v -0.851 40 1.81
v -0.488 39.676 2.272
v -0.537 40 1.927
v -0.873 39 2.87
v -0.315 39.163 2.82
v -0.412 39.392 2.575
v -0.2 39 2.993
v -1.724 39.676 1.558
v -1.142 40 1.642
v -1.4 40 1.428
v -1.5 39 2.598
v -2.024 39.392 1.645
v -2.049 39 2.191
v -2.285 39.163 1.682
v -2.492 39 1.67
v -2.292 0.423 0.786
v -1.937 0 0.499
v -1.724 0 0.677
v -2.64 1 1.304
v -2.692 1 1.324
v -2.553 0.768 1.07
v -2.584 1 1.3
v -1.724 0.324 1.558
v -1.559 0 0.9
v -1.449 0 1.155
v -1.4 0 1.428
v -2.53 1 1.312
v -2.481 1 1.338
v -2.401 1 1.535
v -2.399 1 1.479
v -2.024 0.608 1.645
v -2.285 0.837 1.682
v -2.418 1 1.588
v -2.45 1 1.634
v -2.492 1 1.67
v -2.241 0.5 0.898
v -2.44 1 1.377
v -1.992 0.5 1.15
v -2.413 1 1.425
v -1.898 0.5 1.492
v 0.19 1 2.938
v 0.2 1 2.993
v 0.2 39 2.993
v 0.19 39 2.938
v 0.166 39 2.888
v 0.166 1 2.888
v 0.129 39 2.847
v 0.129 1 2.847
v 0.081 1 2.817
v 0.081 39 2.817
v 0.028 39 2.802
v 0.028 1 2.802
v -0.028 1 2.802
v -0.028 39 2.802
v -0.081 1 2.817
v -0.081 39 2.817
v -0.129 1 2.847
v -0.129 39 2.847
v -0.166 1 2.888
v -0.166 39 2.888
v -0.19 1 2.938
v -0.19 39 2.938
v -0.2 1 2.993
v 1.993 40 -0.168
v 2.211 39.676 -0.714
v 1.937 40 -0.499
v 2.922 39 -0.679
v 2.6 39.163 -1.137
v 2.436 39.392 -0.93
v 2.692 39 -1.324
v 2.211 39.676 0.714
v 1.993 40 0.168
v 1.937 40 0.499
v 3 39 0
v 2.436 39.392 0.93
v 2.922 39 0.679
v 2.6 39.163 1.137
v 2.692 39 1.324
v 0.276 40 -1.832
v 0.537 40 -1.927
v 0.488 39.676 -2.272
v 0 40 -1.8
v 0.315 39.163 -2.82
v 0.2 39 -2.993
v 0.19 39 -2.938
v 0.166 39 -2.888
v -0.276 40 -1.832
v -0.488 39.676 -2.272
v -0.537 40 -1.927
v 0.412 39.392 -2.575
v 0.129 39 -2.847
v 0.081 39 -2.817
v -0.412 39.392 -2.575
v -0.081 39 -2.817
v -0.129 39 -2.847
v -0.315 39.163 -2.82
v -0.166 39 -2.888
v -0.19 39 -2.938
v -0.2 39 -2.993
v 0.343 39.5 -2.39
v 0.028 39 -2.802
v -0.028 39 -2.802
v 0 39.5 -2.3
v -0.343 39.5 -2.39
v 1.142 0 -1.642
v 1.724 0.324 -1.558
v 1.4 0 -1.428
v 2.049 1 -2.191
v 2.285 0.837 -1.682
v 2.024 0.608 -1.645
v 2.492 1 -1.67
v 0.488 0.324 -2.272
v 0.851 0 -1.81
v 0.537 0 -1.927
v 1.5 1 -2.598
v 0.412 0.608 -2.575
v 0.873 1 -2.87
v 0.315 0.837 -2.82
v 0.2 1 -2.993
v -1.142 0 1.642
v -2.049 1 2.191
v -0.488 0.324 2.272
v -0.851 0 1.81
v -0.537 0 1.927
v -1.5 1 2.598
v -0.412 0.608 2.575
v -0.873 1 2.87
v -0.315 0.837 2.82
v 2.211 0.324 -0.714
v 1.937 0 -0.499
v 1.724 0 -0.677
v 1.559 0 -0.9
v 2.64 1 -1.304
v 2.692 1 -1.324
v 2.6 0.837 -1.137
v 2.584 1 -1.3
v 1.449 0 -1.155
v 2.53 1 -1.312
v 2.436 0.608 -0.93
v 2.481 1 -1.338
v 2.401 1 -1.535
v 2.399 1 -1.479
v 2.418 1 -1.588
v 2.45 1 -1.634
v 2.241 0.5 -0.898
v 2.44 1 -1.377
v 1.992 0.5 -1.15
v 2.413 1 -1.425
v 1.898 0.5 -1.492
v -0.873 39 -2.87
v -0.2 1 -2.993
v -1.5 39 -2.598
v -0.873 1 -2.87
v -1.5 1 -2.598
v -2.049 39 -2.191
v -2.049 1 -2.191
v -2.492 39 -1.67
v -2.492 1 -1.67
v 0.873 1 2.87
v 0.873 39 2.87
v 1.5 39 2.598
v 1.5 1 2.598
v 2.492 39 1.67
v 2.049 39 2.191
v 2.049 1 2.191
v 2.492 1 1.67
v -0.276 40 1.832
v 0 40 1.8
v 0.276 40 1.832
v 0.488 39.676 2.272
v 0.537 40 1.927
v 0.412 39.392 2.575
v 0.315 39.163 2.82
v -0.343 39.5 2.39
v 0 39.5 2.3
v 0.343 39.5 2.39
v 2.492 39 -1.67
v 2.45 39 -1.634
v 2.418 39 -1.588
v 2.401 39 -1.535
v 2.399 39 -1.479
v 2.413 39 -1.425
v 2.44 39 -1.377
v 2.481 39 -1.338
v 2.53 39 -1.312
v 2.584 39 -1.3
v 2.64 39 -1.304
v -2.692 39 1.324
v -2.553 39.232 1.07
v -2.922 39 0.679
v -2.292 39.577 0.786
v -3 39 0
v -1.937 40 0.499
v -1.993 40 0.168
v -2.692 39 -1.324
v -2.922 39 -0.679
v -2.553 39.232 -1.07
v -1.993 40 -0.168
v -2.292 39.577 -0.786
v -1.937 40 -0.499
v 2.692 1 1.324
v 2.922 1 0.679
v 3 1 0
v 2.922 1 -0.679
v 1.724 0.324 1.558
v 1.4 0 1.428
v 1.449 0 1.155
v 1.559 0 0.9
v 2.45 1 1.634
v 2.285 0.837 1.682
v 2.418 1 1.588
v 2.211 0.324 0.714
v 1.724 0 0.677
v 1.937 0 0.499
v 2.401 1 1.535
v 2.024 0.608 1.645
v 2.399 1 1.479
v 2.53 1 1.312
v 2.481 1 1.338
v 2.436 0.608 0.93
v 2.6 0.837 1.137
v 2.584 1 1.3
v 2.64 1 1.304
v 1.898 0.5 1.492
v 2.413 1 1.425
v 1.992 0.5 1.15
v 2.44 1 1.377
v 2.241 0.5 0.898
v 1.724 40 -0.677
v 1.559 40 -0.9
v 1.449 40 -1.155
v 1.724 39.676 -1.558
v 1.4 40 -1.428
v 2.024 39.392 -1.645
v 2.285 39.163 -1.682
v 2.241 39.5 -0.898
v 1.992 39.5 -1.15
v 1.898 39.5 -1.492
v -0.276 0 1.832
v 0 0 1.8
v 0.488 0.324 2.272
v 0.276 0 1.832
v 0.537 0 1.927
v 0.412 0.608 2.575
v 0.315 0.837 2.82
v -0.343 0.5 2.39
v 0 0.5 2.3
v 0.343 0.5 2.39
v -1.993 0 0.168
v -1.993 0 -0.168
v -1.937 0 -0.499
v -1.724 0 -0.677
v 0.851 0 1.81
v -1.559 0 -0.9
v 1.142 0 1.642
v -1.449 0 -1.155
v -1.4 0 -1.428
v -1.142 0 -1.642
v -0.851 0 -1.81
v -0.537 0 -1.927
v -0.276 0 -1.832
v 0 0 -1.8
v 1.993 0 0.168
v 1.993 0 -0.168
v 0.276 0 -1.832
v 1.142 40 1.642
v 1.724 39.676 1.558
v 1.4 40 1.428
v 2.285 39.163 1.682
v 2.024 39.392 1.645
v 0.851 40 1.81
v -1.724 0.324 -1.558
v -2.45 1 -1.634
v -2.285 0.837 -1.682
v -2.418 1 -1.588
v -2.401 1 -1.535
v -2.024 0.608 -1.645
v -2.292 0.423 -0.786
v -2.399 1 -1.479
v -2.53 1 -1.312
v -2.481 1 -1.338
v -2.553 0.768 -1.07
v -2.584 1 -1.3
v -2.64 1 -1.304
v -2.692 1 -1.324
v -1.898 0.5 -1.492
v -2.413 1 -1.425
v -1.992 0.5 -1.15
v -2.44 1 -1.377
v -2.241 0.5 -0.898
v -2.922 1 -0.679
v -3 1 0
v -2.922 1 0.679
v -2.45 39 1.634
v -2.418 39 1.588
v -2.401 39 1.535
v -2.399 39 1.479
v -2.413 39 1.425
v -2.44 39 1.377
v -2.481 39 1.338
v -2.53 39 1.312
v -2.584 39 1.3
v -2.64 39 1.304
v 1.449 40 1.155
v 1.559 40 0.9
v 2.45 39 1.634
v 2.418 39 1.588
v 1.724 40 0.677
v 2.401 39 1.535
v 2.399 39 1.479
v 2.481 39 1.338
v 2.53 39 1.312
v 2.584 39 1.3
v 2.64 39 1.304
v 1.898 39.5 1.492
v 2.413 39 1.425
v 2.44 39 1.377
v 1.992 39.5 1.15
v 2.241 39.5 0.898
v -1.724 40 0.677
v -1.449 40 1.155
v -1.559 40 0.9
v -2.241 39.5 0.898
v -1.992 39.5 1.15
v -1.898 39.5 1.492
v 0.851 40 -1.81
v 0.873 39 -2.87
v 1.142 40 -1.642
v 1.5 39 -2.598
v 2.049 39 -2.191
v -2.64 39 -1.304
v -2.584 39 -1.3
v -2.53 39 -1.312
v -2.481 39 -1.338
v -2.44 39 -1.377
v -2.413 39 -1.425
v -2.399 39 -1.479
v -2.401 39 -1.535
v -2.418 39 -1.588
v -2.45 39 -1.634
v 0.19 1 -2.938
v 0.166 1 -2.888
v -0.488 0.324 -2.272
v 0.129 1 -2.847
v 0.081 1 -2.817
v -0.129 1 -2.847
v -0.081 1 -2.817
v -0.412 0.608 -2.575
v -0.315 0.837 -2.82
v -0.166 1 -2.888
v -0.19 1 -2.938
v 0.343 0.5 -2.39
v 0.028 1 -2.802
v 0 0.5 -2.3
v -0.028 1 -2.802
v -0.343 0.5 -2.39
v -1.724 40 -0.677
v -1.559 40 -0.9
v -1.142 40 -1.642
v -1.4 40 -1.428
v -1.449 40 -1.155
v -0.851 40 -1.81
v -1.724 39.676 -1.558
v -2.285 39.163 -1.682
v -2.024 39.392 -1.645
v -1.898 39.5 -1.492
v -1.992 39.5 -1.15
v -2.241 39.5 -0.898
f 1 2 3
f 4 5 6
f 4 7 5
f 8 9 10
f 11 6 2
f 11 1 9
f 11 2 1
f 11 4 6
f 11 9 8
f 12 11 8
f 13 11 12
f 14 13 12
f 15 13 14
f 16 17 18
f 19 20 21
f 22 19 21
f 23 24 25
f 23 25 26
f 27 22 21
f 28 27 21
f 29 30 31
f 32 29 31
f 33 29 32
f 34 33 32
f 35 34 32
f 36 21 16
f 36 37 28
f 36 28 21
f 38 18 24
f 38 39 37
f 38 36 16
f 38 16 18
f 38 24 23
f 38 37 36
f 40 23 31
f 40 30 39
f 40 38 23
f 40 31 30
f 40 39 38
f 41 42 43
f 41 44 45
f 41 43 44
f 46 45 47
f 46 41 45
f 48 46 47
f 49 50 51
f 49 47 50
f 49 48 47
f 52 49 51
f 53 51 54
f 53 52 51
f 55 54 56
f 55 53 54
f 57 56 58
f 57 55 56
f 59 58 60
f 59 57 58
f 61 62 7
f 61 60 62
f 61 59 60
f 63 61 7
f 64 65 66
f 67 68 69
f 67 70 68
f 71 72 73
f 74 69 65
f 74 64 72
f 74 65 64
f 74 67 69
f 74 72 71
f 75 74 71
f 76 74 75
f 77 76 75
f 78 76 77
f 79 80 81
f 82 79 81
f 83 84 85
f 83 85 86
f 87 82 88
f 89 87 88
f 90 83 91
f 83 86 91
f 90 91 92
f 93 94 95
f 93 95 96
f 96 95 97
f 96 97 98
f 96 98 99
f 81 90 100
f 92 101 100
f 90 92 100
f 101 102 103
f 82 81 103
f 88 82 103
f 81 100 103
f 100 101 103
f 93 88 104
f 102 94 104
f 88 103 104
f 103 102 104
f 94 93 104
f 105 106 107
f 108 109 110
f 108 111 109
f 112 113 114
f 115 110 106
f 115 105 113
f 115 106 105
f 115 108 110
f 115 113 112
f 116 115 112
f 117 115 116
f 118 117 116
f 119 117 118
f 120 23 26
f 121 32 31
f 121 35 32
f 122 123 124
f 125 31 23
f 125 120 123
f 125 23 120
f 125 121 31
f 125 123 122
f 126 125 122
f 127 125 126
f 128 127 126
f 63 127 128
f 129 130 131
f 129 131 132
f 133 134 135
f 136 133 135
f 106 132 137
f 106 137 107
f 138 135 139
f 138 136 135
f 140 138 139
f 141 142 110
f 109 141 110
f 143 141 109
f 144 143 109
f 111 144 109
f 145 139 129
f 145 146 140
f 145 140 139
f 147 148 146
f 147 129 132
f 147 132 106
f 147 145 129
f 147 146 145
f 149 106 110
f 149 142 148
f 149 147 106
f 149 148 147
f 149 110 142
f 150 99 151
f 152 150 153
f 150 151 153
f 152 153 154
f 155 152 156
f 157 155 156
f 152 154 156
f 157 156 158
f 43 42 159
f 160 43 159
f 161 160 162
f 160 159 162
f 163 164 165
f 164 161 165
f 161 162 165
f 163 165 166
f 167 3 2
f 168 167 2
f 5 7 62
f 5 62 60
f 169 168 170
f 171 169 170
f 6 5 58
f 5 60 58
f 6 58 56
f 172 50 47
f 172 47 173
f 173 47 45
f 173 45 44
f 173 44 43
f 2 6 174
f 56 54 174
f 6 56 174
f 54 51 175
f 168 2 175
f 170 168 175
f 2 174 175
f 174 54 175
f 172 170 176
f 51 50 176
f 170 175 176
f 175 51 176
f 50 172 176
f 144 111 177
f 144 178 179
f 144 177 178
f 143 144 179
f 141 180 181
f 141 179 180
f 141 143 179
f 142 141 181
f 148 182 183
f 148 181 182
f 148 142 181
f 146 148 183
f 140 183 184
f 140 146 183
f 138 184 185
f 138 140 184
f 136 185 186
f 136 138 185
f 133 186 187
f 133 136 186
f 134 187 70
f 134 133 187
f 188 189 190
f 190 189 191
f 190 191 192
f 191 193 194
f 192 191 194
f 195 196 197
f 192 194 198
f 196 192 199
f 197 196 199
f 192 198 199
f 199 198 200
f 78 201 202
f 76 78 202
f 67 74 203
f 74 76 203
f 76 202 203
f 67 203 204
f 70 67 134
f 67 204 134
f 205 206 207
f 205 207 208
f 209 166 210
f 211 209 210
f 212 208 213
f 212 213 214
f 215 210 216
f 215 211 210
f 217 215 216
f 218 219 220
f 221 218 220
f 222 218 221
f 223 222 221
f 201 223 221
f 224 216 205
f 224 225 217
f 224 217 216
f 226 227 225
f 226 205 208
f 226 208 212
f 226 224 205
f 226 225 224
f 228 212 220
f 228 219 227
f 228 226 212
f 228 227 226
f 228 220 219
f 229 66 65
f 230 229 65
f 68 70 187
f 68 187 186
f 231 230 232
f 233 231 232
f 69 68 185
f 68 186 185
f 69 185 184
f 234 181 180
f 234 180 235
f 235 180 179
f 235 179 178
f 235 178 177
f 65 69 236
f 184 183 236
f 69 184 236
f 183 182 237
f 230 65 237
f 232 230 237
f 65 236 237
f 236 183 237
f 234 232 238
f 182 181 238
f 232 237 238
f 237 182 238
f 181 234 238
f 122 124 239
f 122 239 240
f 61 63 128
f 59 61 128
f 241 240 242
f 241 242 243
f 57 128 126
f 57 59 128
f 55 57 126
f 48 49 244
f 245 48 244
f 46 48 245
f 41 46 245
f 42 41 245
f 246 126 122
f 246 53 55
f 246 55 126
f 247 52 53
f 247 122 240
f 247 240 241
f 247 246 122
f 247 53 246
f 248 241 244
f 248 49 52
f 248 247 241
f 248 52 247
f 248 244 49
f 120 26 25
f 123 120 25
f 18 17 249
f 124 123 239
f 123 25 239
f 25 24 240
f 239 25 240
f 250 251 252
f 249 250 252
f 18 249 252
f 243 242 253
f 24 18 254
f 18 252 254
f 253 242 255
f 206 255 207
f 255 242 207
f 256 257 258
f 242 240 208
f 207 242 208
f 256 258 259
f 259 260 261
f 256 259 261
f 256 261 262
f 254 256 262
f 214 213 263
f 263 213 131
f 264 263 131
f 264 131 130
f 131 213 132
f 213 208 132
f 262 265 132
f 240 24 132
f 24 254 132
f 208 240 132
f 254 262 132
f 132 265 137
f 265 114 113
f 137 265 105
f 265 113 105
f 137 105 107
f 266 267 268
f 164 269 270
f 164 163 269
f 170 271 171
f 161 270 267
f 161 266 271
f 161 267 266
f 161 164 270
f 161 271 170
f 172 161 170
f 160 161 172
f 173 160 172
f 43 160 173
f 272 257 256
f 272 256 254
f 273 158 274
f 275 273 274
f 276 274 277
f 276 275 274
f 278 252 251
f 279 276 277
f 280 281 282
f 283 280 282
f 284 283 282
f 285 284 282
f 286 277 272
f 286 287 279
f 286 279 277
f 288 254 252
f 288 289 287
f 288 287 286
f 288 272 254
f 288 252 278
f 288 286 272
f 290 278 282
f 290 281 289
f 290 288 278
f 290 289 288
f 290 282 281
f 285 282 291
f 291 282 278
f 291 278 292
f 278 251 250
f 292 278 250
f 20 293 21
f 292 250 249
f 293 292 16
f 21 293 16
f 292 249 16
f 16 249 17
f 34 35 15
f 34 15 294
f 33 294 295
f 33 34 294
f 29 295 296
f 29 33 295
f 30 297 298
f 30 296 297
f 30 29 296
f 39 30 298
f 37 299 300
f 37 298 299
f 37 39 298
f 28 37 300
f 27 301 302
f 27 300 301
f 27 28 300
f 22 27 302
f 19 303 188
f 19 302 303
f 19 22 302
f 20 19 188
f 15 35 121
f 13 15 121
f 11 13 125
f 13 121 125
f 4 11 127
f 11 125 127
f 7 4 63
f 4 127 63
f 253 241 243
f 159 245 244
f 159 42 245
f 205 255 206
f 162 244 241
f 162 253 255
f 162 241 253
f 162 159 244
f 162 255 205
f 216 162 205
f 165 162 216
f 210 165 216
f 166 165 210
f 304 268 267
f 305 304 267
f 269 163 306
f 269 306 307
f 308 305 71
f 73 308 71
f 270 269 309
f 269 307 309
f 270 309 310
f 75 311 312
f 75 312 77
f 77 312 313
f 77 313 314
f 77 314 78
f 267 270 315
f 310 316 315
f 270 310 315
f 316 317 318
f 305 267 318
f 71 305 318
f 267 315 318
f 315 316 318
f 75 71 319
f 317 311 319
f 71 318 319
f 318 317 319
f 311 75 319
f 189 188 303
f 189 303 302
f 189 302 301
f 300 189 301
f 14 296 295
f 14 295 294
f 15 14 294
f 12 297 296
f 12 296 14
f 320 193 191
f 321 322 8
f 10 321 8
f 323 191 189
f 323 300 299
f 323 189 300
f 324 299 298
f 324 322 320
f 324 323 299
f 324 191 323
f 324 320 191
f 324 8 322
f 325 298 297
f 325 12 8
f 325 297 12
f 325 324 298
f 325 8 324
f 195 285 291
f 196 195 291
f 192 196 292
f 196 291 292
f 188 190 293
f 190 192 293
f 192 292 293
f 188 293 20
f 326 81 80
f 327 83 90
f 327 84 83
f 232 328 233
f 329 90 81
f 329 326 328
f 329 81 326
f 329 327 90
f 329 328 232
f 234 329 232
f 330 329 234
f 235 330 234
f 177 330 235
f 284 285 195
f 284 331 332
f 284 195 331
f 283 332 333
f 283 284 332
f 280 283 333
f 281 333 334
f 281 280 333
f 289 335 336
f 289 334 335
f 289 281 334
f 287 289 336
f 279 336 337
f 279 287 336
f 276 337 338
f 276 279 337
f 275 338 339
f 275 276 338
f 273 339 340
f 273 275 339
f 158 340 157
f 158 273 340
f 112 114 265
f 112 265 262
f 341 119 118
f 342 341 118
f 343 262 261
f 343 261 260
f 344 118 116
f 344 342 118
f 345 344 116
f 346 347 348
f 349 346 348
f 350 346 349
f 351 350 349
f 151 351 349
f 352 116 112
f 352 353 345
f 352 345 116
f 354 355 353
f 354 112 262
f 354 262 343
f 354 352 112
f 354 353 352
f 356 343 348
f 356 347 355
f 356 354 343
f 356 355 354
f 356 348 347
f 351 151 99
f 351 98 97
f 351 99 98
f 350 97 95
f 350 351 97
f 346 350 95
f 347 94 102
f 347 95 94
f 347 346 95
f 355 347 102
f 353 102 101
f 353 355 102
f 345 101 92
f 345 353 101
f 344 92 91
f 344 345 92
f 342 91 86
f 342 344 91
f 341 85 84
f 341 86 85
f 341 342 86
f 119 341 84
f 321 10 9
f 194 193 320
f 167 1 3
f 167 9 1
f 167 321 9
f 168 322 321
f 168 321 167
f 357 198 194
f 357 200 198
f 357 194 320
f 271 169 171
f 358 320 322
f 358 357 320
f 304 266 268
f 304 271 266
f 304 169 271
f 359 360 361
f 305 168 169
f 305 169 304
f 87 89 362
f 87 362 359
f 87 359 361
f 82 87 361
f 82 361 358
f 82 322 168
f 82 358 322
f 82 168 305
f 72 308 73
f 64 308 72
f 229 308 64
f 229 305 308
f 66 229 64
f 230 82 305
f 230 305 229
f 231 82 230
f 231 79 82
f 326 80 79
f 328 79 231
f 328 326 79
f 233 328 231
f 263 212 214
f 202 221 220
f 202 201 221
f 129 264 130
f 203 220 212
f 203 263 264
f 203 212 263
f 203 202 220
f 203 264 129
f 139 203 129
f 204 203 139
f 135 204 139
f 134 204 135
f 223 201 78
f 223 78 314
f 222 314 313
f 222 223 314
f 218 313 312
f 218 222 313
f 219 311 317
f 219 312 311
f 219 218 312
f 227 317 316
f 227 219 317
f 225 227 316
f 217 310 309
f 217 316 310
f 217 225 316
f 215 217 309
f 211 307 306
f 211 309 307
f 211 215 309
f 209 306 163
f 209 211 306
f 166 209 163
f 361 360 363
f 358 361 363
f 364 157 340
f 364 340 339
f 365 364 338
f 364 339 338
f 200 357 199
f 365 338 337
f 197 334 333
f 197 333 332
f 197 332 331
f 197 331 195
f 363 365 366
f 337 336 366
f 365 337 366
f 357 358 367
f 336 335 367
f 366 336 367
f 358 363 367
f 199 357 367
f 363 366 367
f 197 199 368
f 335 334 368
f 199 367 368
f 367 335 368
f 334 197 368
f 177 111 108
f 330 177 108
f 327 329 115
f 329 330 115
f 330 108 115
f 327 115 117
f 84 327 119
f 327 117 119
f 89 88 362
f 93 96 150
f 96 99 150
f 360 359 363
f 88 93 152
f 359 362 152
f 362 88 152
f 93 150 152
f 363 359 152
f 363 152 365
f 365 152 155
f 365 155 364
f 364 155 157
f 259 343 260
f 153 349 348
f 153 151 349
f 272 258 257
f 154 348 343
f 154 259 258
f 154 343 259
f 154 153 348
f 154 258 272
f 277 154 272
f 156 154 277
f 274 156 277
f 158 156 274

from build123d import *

# Parameters (mm, degrees)
SKETCH1_R           = 3
BOSS_EXTRUDE1_DEPTH = 40
CUT_EXTRUDE1_START  = -41
SKETCH2_R           = 0.2
CUT_EXTRUDE1_DEPTH  = 42
CIRPATTERN1_COUNT   = 6
CHAMFER1_SIZE       = 1


with BuildPart() as part:
    # Sketch1 → Boss-Extrude1 (new body)
    with BuildSketch(Plane(origin=(0, 0, 0), x_dir=(1, 0, 0), z_dir=(0, 1, 0))):
        Circle(SKETCH1_R)
    extrude(amount=BOSS_EXTRUDE1_DEPTH)

    # Sketch2 → Cut-Extrude1 (cut)
    with BuildSketch(Plane(origin=(0, 40, 0), x_dir=(1, 0, 0), z_dir=(0, 1, 0)).offset(CUT_EXTRUDE1_START)):
        with Locations((0, 3)):
            Circle(SKETCH2_R)
    cut_extrude1 = extrude(amount=CUT_EXTRUDE1_DEPTH, mode=Mode.SUBTRACT)

    # CirPattern1: Cut-Extrude1 ×6 about axis
    cirpattern1_axis = Axis((0, 0, 0), (0, 1, 0))
    for i in range(1, CIRPATTERN1_COUNT):
        add(cut_extrude1.rotate(cirpattern1_axis, i * 360 / CIRPATTERN1_COUNT), mode=Mode.SUBTRACT)

    # Chamfer1
    chamfer1_edges = [part.edges().sort_by_distance(p)[0] for p in [
        (-3, 0, 0),
        (-1.5, 0, 2.598076211),
        (1.5, 0, 2.598076211),
        (3, 0, 0),
        (1.5, 0, -2.598076211),
        (-2.424871131, 0, -1.4),
        (-2.424871131, 0, 1.4),
        (0, 0, 2.8),
        (2.424871131, 0, 1.4),
        (2.424871131, 0, -1.4),
        (-3, 40, 0),
        (-1.5, 40, 2.598076211),
        (1.5, 40, 2.598076211),
        (3, 40, 0),
        (1.5, 40, -2.598076211),
        (2.424871131, 40, -1.4),
        (2.424871131, 40, 1.4),
        (0, 40, 2.8),
        (-2.424871131, 40, 1.4),
        (-2.424871131, 40, -1.4),
        (-1.5, 0, -2.598076211),
        (0, 0, -2.8),
        (-1.5, 40, -2.598076211),
        (0, 40, -2.8),
    ]]
    chamfer(chamfer1_edges, length=CHAMFER1_SIZE)


solid = part.part
